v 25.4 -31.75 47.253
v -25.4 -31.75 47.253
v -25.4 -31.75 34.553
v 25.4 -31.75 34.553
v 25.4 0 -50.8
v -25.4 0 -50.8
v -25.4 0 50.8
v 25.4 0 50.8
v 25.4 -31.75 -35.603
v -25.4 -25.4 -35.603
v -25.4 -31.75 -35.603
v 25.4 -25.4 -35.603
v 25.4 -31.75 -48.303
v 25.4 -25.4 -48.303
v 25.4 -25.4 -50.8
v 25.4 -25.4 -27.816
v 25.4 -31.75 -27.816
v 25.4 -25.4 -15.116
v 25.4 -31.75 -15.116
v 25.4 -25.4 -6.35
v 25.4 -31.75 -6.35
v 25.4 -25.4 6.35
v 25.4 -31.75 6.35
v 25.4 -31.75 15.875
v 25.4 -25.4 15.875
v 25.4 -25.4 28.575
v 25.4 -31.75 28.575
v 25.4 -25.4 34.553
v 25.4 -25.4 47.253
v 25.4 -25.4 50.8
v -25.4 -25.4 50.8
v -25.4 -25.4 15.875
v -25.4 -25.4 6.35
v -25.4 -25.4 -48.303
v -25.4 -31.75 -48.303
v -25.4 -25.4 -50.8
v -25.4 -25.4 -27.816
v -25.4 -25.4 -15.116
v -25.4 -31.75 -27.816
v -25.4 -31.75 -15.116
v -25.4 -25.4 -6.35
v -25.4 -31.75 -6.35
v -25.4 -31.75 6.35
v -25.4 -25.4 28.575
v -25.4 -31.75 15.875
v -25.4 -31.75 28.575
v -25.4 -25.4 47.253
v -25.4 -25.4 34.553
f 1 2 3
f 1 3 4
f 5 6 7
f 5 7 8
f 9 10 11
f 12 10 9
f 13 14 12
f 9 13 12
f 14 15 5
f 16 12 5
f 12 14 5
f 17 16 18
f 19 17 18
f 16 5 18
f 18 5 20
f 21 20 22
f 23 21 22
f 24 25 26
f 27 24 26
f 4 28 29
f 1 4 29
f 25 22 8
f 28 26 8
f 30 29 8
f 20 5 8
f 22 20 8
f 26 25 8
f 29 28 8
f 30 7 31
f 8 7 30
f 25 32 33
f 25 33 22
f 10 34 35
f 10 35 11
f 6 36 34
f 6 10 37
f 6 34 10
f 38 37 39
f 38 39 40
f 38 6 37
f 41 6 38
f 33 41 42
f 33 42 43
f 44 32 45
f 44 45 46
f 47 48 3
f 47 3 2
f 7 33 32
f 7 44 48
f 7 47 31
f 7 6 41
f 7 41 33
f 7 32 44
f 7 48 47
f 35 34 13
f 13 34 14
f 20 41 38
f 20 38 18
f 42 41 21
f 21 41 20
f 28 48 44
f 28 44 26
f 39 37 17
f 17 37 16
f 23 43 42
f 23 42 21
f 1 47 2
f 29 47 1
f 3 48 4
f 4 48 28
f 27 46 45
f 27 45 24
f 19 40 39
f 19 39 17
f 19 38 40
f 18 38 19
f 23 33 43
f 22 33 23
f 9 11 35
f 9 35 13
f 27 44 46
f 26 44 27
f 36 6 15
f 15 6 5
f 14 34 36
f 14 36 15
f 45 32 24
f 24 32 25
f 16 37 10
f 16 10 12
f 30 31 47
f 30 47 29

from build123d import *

# Parameters (mm, degrees)
F0_W     = 50.8
F0_H     = 101.6
F1_DEPTH = 25.4
F2_W     = 50.8
F2_H     = 12.7
F3_DEPTH = 6.35
F4_W     = 50.8
F4_H     = 12.7
F5_DEPTH = 6.35


with BuildPart() as f1:
    # F0 (on Front) → F1 (new body)
    with BuildSketch(Plane.XZ):
        Rectangle(F0_W, F0_H)
    extrude(amount=F1_DEPTH)

    # F2 (on face) → F3 (join)
    with BuildSketch(Plane.XZ.offset(25.4)):
        Rectangle(F2_W, F2_H)
    extrude(amount=F3_DEPTH)

    # F4 (on face) → F5 (join)
    with BuildSketch(Plane.XZ.offset(25.4)):
        with Locations((0, 22.225)):
            Rectangle(F4_W, F4_H)
        with Locations((0, 40.902834)):
            Rectangle(F4_W, F4_H)
        with Locations((0, -21.466311)):
            Rectangle(F4_W, F4_H)
        with Locations((0, -41.953252)):
            Rectangle(F4_W, F4_H)
    extrude(amount=F5_DEPTH)


solid = f1.part
